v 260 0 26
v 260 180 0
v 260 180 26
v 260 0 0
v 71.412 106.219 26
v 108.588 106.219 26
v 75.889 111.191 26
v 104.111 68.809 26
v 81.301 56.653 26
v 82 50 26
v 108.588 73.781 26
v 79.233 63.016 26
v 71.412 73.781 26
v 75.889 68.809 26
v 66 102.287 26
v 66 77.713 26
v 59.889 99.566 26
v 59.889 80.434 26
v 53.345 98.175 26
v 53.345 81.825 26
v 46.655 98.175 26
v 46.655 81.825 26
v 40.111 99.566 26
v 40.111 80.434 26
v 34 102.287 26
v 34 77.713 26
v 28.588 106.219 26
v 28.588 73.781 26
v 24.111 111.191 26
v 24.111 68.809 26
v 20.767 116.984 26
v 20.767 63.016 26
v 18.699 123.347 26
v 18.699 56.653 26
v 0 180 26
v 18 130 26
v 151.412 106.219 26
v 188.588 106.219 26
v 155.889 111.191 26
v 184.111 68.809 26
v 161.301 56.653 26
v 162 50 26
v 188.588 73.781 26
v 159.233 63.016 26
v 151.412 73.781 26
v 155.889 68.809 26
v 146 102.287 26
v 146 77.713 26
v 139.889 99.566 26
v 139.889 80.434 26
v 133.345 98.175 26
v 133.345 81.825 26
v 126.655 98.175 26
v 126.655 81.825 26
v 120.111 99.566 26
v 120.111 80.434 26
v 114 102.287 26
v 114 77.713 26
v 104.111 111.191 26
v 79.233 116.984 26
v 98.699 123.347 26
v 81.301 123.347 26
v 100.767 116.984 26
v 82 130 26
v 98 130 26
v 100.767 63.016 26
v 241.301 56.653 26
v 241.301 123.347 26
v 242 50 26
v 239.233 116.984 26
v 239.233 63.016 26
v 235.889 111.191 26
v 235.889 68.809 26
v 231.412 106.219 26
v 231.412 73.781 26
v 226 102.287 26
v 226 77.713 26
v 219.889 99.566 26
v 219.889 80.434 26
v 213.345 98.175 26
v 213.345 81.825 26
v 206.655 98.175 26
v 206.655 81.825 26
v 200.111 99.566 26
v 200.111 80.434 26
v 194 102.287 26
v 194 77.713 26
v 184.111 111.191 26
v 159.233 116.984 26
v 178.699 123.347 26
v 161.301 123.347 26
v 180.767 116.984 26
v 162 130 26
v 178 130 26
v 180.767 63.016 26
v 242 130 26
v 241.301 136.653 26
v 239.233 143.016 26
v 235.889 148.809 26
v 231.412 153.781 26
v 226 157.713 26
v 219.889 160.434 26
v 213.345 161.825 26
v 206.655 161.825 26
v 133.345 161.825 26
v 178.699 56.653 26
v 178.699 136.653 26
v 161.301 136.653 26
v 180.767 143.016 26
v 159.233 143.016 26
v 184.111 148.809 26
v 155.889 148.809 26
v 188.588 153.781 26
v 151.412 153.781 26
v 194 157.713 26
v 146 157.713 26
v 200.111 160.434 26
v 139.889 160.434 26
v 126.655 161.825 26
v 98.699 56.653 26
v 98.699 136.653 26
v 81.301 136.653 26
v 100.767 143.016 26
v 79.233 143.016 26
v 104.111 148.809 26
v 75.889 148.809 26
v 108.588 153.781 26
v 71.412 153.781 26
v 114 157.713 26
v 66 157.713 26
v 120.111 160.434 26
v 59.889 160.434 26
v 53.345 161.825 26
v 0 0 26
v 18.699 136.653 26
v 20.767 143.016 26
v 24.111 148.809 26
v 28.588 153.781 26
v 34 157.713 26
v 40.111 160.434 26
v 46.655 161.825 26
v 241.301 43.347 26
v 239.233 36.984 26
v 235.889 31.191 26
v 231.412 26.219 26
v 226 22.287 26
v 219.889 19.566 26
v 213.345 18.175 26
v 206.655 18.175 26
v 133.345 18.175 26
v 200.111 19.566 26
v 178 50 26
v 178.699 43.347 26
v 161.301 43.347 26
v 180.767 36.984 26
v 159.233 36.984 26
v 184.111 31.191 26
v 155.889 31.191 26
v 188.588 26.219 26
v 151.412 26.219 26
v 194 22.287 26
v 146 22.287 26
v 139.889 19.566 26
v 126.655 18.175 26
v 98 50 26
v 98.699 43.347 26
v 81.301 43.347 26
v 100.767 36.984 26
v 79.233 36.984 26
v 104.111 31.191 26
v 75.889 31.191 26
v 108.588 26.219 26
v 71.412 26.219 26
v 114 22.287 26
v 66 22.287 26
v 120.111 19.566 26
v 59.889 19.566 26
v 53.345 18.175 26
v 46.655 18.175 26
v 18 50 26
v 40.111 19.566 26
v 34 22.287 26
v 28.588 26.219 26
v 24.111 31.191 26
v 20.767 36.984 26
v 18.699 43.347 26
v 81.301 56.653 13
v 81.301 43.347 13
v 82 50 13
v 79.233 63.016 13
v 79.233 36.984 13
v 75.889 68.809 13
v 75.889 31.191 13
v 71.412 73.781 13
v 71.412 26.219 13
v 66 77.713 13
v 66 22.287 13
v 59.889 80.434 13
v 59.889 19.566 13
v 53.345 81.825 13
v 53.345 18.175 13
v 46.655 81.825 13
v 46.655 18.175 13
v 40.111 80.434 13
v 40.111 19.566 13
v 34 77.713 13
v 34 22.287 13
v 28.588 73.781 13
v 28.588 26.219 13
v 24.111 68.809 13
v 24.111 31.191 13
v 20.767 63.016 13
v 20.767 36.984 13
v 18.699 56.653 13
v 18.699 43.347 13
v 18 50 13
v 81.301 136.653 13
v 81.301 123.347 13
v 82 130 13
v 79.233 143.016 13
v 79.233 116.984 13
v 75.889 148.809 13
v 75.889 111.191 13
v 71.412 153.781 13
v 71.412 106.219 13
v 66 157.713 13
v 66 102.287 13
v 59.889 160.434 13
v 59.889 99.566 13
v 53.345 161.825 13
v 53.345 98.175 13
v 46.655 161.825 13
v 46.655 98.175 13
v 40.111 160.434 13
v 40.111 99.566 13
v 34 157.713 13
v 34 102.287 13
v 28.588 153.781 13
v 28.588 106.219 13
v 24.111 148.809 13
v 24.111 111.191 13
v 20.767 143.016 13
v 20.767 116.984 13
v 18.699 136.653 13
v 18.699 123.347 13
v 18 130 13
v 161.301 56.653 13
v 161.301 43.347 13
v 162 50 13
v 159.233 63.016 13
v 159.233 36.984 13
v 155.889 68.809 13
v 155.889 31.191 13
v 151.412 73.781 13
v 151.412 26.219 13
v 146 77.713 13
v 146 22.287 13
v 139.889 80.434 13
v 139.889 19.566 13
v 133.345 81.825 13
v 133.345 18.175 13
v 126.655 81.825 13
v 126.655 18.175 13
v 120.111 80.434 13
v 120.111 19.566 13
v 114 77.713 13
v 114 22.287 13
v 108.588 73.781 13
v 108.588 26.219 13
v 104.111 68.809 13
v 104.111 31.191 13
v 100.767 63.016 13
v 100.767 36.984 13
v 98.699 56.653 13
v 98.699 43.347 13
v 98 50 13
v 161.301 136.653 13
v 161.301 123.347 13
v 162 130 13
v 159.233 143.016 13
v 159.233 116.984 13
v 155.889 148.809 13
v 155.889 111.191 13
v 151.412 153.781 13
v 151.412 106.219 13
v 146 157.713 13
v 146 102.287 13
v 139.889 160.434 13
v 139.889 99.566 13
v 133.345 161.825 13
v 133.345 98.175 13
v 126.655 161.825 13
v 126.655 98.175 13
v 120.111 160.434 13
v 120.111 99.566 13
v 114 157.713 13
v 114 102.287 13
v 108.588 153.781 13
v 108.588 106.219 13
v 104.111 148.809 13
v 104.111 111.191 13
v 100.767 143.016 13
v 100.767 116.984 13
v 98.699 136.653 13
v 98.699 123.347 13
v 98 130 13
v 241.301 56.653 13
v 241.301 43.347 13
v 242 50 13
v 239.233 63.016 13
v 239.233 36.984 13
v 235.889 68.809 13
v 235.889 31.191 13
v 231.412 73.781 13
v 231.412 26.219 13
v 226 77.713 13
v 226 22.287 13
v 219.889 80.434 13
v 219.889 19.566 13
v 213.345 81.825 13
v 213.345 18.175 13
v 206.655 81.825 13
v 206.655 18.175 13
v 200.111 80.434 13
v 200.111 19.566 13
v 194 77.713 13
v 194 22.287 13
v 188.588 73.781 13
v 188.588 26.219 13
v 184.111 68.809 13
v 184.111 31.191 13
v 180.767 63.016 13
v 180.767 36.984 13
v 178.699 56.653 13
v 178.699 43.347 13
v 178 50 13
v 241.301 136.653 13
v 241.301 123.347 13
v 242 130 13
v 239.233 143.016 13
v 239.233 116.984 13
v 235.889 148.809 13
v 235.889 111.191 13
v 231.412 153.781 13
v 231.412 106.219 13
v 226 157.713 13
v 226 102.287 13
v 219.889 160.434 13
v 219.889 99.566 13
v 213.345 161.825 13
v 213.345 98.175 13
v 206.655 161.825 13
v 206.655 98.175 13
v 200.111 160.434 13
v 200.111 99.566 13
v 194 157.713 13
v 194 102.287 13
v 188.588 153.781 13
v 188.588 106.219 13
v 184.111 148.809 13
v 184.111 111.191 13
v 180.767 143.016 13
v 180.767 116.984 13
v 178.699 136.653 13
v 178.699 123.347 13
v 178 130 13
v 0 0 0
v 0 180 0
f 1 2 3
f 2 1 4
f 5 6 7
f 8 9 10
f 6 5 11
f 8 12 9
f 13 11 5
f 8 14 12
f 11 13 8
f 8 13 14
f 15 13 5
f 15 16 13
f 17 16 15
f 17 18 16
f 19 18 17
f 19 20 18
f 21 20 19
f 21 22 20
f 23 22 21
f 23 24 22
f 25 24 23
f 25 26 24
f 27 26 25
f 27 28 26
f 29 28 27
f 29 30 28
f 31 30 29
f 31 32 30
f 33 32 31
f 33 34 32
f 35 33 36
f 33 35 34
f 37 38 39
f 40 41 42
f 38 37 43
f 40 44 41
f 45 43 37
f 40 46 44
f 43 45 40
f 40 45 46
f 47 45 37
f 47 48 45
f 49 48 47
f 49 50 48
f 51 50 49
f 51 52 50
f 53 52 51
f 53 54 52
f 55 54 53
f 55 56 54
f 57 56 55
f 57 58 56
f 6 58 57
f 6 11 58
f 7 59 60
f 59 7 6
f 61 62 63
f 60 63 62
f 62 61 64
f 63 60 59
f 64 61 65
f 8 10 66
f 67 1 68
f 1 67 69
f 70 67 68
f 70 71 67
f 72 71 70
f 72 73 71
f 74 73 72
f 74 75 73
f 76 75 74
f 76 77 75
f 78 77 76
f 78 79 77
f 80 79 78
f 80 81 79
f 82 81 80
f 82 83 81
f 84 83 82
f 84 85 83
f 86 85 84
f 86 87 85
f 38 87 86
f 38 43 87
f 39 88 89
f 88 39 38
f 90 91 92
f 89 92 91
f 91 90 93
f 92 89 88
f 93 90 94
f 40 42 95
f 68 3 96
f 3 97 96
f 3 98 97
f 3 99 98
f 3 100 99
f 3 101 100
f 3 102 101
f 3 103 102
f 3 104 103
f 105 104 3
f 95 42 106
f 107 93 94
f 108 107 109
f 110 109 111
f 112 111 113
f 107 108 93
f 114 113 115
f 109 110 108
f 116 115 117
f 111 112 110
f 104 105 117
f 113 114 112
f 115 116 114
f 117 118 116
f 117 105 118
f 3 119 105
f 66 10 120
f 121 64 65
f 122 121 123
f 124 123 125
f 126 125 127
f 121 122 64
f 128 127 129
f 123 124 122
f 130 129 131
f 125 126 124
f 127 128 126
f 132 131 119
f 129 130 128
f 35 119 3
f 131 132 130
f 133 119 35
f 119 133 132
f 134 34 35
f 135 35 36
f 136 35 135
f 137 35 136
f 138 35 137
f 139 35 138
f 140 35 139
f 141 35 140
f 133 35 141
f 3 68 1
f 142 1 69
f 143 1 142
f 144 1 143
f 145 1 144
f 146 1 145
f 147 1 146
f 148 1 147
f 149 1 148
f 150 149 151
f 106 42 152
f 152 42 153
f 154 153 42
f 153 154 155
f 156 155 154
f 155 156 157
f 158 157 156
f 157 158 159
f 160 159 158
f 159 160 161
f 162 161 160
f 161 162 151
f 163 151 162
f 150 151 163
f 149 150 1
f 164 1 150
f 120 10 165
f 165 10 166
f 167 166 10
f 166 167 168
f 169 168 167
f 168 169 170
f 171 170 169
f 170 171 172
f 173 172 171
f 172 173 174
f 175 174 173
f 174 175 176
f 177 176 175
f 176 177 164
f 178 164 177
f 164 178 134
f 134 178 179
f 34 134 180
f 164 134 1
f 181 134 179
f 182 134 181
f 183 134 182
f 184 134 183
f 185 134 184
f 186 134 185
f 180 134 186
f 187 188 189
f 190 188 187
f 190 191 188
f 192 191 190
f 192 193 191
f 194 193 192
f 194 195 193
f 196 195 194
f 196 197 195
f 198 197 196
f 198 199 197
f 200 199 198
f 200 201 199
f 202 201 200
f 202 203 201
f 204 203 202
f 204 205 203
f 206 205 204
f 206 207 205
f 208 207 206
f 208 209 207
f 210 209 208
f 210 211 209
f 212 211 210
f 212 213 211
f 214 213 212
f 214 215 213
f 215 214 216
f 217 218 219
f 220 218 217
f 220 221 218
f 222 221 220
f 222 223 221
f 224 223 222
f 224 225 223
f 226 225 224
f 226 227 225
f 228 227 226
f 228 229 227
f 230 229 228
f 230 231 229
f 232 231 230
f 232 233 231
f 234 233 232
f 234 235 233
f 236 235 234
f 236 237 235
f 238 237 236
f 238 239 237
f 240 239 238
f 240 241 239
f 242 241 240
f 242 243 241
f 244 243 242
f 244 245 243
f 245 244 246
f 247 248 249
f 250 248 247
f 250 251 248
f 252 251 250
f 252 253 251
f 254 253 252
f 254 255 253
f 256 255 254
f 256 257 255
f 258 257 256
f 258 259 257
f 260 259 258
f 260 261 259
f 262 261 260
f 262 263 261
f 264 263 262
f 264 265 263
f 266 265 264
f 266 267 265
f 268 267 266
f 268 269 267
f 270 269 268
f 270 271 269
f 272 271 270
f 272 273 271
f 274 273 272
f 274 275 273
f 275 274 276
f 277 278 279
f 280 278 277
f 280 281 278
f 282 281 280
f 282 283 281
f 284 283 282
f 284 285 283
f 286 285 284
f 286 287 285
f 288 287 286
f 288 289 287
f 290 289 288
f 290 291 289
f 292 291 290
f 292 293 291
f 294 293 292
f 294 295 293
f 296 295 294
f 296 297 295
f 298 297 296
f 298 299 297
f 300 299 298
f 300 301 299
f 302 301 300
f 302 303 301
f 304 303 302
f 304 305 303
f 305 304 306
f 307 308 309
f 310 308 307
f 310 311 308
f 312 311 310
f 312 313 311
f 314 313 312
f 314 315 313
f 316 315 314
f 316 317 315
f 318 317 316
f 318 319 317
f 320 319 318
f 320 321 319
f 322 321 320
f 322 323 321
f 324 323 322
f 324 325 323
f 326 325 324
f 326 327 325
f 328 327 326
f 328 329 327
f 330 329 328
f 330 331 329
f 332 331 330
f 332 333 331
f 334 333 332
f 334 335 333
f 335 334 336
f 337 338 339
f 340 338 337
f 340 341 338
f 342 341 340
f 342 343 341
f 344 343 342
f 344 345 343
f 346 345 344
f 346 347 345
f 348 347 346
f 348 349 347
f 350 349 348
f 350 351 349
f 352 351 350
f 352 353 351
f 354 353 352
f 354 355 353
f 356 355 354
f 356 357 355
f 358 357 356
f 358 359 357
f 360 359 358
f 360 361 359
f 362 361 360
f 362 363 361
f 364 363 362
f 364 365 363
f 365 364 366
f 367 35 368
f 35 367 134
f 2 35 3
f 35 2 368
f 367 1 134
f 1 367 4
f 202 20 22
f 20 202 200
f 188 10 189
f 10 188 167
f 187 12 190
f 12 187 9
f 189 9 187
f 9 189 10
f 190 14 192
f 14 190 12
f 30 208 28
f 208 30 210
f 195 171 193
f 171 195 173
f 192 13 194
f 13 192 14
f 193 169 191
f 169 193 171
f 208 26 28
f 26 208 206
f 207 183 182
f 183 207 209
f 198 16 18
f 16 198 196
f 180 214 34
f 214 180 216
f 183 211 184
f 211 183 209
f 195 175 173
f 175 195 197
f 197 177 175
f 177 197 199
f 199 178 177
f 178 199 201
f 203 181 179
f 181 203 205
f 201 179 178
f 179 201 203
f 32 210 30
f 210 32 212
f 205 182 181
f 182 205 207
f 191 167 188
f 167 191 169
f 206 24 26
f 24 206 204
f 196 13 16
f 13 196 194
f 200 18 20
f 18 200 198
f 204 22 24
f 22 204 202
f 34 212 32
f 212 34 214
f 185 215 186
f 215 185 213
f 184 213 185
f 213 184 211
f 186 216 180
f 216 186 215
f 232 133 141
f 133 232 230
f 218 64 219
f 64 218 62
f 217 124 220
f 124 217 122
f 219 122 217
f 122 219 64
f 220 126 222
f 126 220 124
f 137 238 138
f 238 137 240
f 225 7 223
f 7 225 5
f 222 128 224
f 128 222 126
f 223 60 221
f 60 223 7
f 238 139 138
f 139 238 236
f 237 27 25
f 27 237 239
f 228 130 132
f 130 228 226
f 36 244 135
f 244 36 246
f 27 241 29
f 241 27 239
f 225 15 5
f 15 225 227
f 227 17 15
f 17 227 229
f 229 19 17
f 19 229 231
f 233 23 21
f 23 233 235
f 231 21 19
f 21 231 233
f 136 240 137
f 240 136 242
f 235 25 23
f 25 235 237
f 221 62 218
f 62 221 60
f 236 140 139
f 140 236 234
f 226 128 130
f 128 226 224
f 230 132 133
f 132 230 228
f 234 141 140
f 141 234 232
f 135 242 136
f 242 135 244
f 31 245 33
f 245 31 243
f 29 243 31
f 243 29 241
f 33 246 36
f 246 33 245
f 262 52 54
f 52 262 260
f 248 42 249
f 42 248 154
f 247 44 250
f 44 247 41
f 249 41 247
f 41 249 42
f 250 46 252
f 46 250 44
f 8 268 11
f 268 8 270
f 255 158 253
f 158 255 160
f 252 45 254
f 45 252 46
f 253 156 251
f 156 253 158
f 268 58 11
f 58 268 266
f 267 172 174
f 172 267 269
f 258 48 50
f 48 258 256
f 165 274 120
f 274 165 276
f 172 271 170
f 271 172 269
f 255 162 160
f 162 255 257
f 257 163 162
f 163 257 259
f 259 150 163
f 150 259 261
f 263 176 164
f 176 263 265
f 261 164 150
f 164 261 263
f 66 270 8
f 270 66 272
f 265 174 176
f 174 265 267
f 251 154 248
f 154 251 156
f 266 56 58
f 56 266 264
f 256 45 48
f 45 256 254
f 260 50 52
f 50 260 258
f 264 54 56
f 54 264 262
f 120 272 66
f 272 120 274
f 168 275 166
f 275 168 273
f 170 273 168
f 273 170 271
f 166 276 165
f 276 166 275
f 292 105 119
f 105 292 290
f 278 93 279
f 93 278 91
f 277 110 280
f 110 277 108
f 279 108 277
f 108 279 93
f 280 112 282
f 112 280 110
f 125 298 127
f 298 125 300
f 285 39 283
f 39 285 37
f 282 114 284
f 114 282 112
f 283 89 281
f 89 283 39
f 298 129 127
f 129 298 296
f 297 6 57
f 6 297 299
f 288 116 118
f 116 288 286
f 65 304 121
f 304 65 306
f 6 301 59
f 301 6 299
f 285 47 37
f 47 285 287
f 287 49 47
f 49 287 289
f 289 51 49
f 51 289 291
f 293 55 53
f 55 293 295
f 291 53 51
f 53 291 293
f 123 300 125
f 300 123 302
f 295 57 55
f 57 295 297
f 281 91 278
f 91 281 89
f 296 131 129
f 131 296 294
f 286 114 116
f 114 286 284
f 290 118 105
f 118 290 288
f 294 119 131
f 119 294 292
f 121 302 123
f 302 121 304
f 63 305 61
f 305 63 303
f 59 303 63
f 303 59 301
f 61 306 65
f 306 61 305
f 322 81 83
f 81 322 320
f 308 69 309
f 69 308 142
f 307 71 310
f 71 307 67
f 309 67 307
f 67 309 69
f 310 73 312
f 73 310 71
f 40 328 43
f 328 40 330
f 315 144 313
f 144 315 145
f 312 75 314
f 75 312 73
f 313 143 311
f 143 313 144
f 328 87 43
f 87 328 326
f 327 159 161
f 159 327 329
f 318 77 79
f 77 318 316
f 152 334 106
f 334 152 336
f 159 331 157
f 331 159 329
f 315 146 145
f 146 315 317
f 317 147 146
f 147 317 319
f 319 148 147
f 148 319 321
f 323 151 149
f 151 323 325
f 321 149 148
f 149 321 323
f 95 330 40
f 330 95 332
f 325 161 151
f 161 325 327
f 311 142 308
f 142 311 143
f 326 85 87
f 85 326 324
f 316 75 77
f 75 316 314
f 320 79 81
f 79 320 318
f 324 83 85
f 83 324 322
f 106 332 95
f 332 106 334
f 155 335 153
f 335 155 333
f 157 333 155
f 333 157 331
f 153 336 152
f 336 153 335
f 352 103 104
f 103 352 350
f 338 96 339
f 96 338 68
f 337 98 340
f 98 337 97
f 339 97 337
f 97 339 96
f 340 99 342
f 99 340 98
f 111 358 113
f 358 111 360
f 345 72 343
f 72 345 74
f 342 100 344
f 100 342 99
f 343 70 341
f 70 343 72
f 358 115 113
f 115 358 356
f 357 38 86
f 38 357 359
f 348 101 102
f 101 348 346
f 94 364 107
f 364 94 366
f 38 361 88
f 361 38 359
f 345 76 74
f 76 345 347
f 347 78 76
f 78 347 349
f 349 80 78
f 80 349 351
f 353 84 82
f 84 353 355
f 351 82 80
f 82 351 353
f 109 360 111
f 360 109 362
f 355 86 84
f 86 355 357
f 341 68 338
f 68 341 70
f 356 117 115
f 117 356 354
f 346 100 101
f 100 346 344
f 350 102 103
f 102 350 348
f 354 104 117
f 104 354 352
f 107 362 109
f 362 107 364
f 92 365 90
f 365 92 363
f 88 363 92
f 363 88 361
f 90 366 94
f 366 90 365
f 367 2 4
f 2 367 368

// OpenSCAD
difference(){
translate([0,0,13])
    cube([260,180,13]);
translate([50,50,0])
    cylinder(30,32,32);
translate([50,130,0])
    cylinder(30,32,32);
translate([130,50,0])
    cylinder(30,32,32);
translate([130,130,0])
    cylinder(30,32,32);
translate([210,50,0])
    cylinder(30,32,32);
translate([210,130,0])
    cylinder(30,32,32);}
cube([260,180,13]);
